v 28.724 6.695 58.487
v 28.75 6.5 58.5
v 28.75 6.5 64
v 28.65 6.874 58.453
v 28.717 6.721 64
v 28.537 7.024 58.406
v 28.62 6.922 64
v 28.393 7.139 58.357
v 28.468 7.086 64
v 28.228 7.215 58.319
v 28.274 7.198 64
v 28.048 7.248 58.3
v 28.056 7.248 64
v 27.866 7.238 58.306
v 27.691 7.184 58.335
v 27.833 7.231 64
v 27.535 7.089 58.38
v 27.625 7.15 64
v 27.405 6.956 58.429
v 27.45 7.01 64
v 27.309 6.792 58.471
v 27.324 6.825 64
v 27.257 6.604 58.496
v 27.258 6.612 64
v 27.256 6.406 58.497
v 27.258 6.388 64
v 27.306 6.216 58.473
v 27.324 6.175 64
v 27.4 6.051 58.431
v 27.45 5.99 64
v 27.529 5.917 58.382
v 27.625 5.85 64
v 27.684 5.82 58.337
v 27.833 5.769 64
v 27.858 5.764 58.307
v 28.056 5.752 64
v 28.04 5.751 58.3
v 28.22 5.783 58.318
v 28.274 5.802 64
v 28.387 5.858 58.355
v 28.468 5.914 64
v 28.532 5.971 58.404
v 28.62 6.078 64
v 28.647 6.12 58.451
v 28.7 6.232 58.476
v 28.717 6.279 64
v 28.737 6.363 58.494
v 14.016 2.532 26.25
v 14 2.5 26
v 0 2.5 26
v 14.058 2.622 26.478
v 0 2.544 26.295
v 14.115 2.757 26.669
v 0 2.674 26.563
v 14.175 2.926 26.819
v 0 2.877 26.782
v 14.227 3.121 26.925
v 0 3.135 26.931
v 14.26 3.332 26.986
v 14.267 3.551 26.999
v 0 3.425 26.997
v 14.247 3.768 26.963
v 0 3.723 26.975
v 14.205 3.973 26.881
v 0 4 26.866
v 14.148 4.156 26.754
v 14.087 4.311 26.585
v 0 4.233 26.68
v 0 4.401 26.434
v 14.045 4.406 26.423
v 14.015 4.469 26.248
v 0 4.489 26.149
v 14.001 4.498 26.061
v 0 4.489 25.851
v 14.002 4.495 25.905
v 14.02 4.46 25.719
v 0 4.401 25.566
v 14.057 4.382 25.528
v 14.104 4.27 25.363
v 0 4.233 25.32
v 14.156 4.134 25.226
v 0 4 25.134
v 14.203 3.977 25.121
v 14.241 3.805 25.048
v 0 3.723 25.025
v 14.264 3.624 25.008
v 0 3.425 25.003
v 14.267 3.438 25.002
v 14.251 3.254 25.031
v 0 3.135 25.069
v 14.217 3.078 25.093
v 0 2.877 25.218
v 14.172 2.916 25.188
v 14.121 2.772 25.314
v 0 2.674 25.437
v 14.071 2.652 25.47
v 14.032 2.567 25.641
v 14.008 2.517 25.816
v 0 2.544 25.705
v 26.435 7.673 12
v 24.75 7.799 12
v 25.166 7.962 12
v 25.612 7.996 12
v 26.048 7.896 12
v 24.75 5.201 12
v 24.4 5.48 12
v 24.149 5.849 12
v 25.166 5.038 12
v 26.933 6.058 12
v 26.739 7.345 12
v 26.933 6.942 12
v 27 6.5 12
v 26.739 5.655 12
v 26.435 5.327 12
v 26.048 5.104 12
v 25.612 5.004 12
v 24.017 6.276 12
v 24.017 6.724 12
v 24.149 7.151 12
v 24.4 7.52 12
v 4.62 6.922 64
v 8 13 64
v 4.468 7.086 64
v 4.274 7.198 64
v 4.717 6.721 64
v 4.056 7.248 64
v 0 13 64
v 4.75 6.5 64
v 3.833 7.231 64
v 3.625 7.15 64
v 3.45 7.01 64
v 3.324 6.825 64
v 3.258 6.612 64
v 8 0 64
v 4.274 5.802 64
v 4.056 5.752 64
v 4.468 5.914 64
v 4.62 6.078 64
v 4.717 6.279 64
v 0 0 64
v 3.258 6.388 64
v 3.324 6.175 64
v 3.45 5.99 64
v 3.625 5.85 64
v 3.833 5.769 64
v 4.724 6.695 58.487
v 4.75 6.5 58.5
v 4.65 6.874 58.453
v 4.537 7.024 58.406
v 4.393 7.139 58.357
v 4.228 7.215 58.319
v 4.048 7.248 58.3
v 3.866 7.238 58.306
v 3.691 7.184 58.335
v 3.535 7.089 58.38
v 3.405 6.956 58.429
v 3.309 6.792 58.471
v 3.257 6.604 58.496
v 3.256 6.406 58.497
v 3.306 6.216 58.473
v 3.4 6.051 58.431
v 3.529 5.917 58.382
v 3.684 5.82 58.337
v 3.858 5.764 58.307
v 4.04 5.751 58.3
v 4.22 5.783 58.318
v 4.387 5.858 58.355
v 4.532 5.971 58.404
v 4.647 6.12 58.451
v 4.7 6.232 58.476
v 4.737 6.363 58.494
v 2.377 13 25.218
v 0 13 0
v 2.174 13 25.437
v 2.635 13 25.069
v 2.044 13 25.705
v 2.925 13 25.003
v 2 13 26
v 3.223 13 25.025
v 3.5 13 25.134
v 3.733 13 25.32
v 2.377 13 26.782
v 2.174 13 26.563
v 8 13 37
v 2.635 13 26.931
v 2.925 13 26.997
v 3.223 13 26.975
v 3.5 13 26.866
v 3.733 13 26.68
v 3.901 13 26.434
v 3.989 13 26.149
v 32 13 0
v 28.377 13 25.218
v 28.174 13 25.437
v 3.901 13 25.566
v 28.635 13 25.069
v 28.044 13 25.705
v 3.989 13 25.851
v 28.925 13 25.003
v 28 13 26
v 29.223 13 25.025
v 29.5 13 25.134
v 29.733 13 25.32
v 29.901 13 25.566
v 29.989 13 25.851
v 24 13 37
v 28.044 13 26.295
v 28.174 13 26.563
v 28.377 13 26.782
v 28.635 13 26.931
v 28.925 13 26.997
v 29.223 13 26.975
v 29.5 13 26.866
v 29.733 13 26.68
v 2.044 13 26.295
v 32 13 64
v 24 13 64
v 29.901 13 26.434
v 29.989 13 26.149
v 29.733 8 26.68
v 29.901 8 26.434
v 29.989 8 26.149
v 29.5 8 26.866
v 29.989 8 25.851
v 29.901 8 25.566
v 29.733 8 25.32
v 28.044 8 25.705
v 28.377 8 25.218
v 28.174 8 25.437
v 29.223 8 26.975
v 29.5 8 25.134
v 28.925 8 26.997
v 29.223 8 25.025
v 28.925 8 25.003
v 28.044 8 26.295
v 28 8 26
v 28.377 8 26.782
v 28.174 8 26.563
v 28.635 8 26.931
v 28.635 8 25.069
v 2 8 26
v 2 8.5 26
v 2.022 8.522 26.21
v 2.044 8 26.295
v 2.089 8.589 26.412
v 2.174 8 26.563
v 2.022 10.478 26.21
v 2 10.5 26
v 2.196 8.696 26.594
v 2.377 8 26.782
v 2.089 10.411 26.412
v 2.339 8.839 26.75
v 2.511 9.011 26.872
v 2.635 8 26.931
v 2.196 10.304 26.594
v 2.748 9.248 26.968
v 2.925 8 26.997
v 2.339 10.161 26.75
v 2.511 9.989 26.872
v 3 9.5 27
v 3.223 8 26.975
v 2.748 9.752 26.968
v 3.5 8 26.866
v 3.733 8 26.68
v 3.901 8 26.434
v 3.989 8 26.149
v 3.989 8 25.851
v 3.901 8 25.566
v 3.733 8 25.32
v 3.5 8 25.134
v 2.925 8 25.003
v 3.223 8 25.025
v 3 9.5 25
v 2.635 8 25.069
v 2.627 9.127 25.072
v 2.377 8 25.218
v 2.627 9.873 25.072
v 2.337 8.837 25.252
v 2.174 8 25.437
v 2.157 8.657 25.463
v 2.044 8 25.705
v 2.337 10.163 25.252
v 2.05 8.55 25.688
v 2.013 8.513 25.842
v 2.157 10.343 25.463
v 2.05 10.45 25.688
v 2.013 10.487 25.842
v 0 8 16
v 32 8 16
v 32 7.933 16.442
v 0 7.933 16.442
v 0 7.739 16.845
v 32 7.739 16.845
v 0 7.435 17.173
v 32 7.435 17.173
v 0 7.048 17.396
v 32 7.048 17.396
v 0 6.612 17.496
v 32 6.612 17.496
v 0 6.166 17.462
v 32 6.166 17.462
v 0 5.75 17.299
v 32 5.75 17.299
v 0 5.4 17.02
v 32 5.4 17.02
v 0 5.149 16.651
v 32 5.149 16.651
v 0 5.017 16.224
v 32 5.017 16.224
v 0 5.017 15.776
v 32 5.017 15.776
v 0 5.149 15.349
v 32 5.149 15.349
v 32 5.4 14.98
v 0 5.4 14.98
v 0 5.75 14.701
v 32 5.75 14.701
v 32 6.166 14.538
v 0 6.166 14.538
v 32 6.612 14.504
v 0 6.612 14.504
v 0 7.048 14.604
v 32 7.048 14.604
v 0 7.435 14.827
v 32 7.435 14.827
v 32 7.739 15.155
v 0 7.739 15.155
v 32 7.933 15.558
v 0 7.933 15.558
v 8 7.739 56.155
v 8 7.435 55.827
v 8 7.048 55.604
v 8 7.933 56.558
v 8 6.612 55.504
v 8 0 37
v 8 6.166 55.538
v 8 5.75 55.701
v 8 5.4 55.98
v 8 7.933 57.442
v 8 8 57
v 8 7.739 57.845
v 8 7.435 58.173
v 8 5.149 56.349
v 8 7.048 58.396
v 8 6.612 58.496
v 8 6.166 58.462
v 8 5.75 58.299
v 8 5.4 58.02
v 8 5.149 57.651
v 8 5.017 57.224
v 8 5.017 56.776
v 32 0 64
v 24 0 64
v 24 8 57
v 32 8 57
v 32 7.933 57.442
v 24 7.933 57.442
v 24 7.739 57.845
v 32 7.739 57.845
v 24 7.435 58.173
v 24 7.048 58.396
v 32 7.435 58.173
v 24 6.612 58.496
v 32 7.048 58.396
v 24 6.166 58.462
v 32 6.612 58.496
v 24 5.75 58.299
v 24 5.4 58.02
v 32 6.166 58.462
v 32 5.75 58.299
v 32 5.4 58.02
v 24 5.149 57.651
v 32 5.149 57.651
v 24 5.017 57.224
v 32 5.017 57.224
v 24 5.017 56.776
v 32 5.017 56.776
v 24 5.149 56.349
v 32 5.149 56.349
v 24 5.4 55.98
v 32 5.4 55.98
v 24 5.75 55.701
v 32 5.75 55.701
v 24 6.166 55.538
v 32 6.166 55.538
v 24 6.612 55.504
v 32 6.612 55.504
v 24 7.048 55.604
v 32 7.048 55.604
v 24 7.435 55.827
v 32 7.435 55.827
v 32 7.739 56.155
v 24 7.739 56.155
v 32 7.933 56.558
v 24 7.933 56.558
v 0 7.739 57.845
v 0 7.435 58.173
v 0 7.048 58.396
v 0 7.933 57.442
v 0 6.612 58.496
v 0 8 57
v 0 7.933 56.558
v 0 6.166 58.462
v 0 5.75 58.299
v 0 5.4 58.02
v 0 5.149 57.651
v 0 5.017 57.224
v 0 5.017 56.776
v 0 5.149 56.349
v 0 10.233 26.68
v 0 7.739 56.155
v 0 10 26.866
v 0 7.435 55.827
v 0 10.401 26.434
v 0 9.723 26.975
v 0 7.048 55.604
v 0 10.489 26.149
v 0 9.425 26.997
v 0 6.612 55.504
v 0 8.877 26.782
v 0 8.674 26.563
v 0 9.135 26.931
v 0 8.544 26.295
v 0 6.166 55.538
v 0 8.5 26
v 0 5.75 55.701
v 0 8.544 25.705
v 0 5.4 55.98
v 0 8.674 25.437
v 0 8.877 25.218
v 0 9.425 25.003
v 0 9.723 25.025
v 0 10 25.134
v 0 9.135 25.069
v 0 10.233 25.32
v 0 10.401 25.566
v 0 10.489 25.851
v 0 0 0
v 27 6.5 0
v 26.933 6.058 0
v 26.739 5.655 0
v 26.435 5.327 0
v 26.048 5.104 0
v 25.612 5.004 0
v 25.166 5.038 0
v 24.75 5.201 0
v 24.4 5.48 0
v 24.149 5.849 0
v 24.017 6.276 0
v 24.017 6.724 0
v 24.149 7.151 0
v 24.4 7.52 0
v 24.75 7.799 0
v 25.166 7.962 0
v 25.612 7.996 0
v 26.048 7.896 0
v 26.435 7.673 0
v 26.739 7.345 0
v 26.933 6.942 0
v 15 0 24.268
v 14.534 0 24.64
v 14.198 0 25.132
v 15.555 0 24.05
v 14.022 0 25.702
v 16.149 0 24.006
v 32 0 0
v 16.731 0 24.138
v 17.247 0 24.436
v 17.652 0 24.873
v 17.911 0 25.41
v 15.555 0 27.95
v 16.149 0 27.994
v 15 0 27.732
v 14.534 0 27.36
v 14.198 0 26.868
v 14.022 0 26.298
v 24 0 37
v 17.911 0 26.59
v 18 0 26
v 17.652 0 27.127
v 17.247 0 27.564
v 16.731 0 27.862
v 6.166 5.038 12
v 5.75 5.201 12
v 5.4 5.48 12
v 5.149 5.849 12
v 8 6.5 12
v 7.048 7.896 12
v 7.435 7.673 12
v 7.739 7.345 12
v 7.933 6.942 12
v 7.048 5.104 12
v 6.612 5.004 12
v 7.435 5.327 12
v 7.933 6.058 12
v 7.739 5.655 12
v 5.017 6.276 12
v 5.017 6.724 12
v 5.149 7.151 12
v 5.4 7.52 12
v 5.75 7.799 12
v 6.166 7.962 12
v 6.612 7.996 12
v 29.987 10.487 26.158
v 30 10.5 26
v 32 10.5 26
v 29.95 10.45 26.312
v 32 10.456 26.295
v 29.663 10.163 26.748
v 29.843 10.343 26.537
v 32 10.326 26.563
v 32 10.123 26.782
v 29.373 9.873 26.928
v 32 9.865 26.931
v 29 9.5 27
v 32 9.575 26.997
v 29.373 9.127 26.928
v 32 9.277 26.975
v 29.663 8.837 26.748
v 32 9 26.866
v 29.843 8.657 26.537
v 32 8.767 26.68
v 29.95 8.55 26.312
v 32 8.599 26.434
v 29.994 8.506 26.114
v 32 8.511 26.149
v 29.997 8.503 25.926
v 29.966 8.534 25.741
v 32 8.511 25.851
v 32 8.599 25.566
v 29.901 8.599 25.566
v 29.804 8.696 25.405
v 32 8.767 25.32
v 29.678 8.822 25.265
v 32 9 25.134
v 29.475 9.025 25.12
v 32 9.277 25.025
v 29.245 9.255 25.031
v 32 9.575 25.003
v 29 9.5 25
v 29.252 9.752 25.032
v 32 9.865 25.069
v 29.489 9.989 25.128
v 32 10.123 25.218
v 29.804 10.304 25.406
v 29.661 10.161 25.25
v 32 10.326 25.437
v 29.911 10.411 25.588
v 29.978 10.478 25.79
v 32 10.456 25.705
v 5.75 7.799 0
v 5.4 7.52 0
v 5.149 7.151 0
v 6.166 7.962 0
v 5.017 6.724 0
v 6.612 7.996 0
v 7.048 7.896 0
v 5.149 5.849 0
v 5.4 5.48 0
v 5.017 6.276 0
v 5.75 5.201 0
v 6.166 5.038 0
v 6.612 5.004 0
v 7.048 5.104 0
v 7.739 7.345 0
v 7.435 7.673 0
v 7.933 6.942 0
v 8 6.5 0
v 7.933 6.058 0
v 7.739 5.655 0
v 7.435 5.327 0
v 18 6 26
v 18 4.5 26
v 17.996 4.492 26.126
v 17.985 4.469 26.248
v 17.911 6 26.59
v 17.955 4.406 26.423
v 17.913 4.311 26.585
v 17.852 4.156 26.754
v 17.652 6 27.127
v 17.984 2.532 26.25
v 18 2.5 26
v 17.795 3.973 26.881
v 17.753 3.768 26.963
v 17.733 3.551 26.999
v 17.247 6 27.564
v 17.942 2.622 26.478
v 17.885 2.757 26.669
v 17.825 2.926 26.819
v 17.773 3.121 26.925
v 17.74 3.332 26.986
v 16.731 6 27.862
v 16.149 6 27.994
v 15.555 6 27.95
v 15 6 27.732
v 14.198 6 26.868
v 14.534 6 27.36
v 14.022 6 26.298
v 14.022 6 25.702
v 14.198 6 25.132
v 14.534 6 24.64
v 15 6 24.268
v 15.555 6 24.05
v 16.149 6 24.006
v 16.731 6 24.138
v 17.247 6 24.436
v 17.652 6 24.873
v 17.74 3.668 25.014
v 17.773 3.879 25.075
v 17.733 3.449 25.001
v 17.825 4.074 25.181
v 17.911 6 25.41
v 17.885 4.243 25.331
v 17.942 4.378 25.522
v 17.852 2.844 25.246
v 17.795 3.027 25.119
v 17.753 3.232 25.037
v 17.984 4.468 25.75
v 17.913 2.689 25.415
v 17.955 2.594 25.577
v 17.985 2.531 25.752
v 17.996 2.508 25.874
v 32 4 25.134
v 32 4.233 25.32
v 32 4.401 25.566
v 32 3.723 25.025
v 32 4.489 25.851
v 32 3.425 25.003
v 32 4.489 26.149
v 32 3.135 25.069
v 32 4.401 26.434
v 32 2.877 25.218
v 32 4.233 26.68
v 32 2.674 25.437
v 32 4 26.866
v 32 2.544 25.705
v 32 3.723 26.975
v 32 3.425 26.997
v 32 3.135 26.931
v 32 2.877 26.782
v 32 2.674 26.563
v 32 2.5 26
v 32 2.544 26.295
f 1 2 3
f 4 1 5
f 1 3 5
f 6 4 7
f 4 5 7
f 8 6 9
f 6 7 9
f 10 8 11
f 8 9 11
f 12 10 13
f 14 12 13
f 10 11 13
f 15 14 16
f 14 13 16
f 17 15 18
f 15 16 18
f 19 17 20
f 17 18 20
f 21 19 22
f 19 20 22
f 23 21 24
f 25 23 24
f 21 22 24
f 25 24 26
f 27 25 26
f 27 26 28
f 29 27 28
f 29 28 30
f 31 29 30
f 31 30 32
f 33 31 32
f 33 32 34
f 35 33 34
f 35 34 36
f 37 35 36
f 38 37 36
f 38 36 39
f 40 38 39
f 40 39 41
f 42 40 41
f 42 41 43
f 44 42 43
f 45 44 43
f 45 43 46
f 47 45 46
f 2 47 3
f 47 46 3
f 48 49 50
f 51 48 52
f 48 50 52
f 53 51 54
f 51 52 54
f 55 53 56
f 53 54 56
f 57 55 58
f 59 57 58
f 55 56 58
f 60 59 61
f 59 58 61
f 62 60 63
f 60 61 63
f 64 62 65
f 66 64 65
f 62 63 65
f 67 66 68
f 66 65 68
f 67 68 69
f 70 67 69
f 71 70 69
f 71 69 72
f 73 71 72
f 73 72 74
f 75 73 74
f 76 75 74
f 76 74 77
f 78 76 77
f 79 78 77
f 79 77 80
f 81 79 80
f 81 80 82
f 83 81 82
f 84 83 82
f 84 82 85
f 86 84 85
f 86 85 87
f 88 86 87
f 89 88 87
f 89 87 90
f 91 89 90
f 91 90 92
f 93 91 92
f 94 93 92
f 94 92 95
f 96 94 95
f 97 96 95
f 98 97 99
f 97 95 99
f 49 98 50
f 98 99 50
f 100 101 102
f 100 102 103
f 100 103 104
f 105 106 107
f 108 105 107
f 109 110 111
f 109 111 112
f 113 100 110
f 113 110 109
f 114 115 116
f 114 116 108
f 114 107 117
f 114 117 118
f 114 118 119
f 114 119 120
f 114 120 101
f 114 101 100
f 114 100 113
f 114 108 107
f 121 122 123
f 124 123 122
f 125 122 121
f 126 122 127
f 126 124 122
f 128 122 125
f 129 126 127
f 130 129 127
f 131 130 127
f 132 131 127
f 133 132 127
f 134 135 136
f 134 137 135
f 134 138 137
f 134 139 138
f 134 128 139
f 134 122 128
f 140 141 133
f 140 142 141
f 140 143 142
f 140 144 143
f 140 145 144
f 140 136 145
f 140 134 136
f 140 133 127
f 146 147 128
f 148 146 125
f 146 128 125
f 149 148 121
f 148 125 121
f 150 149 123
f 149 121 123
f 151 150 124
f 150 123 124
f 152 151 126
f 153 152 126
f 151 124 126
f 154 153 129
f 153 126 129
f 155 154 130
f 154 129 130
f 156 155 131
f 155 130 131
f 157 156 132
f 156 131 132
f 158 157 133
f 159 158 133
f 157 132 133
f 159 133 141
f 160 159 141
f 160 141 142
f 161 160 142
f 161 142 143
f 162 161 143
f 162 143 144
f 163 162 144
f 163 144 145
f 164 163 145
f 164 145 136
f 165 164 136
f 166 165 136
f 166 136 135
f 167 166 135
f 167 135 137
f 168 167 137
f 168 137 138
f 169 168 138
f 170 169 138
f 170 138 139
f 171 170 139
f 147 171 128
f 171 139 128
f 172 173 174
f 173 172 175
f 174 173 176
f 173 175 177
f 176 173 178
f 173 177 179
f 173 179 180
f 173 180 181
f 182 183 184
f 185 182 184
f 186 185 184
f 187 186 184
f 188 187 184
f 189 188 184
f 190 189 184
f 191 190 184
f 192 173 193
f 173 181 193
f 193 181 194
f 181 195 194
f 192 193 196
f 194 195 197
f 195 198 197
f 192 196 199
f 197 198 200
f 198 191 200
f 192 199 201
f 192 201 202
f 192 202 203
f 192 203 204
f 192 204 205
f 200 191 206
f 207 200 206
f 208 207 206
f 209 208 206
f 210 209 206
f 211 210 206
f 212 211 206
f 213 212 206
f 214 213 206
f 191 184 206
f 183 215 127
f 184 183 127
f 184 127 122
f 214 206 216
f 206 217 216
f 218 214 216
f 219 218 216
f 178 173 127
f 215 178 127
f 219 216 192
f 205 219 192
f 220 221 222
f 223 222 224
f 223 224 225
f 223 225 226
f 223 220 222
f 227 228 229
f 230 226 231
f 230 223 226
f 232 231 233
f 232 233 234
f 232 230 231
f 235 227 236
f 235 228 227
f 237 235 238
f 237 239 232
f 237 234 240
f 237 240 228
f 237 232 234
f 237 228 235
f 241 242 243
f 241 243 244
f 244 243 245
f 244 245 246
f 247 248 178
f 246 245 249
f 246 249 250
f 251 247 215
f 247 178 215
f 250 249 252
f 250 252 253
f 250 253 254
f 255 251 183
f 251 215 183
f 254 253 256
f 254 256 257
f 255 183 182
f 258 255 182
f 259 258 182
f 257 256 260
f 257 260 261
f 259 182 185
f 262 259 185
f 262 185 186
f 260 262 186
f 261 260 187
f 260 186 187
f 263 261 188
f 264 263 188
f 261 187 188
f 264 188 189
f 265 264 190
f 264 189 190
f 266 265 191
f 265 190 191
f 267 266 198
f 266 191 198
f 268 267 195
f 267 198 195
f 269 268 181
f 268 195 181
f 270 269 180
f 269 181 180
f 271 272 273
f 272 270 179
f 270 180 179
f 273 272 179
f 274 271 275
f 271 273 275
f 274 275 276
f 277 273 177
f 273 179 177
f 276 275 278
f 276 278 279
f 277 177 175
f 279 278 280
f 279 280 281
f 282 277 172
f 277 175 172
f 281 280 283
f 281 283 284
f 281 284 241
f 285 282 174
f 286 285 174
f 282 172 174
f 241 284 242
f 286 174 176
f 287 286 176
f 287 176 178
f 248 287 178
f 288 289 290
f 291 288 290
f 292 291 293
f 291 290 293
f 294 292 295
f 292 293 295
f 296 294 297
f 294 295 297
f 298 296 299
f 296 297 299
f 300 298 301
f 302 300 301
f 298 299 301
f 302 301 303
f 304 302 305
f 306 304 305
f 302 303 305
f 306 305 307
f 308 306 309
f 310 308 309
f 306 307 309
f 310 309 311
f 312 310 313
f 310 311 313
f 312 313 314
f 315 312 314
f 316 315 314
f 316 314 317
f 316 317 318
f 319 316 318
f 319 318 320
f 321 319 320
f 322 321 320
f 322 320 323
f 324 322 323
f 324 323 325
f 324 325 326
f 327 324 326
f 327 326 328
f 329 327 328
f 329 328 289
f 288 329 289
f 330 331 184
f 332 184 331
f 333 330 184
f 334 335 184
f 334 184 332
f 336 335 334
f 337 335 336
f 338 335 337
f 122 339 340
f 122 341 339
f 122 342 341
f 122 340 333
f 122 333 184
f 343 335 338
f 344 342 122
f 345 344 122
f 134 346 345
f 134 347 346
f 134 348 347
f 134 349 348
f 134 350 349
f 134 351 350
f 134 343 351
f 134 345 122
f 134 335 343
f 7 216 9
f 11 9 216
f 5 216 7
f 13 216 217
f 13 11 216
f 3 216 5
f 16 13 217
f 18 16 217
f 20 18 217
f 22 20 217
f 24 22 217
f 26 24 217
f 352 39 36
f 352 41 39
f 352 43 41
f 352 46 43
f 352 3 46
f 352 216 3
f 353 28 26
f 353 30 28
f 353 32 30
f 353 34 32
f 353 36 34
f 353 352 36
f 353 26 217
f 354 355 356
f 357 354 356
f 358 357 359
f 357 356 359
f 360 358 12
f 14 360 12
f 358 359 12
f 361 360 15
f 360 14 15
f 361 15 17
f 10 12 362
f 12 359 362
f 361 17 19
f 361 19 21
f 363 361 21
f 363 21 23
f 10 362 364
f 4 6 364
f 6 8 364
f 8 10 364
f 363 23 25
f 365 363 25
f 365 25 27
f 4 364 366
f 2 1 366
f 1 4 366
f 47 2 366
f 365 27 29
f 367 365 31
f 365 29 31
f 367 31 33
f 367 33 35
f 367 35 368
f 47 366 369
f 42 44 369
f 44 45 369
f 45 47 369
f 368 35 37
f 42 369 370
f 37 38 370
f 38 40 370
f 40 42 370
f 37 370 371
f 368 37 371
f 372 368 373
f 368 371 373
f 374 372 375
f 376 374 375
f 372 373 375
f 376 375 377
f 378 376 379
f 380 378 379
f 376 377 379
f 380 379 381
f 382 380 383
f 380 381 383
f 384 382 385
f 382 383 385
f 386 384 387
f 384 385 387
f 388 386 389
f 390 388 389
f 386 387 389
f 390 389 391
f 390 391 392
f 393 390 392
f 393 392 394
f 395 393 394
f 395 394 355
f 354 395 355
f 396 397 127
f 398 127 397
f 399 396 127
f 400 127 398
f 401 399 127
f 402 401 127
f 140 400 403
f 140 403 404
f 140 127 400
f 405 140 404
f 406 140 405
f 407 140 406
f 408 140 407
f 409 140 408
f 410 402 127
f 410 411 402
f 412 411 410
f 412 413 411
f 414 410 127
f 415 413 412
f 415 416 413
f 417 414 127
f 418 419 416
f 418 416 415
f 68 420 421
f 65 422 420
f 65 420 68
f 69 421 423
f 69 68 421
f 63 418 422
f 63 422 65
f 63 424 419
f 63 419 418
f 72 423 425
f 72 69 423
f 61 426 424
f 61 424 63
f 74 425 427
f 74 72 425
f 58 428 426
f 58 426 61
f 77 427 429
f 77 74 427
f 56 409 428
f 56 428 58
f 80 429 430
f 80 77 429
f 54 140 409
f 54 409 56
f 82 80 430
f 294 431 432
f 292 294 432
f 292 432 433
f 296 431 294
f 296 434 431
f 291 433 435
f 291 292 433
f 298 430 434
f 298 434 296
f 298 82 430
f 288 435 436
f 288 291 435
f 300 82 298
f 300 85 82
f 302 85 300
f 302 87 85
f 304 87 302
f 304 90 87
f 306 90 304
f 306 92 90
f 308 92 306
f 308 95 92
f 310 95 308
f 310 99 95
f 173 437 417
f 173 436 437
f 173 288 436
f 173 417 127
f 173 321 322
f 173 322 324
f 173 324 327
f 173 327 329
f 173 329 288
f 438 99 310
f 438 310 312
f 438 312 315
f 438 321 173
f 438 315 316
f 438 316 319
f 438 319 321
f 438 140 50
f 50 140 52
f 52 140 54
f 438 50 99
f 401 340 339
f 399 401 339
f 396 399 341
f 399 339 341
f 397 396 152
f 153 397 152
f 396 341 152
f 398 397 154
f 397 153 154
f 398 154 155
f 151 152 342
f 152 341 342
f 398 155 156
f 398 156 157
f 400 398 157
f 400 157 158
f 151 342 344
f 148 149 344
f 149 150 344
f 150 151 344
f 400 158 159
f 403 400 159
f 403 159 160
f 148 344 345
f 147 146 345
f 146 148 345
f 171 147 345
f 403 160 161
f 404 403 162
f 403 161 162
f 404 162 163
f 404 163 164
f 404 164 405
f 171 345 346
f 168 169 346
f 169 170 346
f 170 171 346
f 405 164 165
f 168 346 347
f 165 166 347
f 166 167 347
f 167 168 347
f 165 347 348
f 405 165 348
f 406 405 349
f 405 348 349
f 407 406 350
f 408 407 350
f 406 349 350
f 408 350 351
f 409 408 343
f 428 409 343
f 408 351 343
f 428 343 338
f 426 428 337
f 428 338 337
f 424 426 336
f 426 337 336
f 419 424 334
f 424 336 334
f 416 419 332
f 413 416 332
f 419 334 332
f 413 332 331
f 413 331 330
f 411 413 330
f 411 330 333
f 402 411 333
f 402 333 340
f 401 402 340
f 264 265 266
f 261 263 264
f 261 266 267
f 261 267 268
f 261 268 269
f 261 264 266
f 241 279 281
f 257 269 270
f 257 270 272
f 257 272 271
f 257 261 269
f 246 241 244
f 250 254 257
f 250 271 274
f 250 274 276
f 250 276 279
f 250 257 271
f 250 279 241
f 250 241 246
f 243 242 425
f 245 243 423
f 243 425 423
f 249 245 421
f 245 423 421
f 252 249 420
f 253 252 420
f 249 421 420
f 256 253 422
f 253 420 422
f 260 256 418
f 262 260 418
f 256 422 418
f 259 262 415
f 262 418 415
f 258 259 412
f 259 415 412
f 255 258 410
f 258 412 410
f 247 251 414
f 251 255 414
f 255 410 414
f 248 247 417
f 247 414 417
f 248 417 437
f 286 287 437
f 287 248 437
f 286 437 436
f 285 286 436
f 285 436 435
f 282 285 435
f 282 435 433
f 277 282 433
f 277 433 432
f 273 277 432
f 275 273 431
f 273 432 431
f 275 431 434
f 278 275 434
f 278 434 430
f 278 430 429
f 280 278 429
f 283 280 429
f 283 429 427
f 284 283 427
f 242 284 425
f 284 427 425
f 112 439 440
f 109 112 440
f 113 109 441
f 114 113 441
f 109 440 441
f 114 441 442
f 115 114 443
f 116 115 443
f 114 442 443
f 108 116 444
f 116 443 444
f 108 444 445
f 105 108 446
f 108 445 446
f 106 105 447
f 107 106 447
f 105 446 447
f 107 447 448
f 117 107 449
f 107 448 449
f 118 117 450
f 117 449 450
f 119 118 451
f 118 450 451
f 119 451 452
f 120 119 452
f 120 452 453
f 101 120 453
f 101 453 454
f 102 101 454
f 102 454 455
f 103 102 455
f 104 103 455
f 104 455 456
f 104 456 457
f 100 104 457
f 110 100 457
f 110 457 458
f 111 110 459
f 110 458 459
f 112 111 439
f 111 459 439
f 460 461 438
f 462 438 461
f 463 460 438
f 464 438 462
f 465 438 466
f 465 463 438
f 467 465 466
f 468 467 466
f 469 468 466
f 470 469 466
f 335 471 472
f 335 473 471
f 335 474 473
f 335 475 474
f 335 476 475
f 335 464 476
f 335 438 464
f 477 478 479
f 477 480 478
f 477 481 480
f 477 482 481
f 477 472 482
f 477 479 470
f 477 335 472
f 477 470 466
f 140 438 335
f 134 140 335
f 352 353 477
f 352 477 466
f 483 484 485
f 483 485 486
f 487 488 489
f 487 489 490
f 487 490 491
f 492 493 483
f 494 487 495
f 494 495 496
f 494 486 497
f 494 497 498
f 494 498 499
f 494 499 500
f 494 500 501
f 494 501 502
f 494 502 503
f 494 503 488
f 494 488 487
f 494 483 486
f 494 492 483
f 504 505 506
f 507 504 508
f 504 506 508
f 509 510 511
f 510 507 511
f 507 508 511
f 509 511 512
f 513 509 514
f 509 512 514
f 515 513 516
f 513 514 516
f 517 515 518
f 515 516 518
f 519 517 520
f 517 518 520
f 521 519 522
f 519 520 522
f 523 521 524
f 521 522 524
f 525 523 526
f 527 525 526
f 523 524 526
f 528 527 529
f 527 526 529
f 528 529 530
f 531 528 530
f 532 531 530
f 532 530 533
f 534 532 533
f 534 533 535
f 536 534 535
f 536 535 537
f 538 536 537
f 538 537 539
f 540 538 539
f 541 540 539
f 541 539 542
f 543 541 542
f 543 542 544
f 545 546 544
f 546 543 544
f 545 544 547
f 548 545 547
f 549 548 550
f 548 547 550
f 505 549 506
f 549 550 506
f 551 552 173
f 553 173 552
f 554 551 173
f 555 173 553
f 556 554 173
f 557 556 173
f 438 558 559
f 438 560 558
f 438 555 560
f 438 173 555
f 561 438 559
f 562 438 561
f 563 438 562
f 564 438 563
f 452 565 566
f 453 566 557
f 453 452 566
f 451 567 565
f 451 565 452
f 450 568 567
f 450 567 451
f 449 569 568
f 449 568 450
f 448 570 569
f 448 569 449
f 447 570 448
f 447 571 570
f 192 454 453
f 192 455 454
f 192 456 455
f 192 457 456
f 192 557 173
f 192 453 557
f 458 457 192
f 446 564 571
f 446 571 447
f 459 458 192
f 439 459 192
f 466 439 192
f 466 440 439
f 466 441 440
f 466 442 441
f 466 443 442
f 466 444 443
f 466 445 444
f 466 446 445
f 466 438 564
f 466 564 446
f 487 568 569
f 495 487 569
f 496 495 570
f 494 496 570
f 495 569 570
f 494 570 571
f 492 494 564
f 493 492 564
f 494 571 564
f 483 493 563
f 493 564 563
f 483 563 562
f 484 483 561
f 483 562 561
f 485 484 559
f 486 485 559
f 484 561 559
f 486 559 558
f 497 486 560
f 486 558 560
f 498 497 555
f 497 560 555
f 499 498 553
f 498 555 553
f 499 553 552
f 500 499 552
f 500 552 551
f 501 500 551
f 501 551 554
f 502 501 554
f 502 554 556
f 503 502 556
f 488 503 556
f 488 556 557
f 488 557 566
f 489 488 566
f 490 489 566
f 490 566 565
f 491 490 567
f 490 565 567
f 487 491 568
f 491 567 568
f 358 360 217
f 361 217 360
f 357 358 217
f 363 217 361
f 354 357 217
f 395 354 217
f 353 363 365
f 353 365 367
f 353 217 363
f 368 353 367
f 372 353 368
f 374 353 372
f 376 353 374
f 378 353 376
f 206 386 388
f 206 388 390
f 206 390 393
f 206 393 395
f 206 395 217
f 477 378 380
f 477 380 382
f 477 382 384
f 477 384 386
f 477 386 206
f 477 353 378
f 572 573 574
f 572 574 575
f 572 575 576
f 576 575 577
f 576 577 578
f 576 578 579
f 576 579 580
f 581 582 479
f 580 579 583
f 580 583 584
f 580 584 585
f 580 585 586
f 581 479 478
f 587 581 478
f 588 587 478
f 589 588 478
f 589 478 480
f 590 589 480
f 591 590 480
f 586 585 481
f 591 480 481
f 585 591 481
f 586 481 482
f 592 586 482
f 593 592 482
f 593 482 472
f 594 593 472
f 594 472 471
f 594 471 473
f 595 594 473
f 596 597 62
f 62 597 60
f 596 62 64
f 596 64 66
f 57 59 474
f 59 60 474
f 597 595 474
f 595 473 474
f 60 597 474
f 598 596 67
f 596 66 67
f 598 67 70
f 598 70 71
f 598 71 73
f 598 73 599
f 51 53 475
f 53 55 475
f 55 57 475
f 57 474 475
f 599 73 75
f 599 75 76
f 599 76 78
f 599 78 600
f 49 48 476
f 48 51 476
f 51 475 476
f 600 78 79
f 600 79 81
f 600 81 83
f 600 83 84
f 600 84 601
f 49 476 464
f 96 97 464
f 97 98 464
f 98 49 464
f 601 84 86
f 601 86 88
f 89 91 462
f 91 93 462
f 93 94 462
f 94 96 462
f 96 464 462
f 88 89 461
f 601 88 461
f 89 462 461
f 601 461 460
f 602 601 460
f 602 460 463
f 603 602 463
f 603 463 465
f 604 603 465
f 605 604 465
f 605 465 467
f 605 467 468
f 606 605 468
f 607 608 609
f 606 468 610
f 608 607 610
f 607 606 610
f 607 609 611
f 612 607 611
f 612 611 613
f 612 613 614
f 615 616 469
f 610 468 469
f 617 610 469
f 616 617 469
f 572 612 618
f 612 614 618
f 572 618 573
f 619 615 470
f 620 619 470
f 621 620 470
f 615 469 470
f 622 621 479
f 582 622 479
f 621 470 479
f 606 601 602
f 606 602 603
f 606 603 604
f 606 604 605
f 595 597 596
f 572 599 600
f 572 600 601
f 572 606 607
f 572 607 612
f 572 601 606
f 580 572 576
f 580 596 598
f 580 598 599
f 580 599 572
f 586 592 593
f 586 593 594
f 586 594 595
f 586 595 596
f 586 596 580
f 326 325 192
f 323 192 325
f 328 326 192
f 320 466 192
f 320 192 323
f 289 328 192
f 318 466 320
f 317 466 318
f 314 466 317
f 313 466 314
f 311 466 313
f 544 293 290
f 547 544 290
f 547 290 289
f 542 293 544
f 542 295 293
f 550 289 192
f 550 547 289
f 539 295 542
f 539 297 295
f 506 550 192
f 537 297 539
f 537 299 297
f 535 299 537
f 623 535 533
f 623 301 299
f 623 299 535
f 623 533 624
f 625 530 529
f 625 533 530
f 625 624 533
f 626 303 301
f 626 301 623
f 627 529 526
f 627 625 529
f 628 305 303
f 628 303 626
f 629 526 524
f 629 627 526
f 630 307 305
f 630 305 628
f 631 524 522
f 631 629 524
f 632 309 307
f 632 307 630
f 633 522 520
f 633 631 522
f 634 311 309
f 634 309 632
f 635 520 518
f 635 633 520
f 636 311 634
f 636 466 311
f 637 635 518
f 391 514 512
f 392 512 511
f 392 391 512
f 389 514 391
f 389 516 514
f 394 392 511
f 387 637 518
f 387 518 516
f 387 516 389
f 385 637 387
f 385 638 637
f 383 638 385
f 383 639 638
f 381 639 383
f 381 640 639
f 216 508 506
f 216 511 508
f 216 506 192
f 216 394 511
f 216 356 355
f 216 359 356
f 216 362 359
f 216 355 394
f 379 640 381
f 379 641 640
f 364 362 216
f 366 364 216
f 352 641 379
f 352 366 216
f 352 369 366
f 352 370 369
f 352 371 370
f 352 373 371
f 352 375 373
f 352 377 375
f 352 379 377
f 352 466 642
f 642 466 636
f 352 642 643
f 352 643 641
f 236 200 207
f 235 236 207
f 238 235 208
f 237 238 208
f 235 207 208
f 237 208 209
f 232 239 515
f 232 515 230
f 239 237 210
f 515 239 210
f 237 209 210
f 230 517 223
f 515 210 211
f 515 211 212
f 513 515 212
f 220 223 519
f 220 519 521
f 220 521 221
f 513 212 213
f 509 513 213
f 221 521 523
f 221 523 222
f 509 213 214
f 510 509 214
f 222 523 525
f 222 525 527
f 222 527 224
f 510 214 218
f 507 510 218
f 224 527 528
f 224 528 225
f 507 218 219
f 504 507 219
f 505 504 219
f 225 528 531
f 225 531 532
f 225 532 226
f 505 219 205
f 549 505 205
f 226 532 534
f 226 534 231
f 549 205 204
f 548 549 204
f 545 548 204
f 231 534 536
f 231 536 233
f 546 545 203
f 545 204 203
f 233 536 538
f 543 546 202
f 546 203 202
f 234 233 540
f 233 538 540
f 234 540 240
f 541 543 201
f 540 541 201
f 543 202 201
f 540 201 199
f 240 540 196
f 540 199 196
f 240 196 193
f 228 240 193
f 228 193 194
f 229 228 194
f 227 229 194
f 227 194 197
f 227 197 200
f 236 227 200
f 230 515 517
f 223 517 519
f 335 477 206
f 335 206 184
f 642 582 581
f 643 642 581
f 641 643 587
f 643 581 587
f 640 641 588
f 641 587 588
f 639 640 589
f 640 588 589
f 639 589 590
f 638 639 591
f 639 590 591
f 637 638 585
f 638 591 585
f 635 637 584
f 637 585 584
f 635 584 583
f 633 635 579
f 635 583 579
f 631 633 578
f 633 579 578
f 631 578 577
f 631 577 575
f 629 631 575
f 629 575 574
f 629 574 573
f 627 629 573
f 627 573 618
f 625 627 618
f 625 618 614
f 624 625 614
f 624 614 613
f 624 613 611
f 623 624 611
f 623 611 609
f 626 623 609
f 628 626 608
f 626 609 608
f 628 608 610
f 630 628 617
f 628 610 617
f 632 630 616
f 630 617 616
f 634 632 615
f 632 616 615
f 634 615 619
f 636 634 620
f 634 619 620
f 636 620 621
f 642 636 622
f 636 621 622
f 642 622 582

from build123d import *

# Parameters (mm, degrees)
F1_DEPTH  = 13
F2_R      = 1.5
F3_DEPTH  = 12
F4_R      = 1.5
F5_DEPTH  = 32.001
F6_DEPTH  = 32.001
F7_R      = 2
F8_DEPTH  = 6
F9_R      = 1
F10_DEPTH = 32.001
F11_R     = 1
F12_DEPTH = 5
F13_R     = 1
F14_DEPTH = 3.001
F15_R     = 1
F16_DEPTH = 3.001
F17_R     = 0.75
F18_DEPTH = 5.7019619943


with BuildPart() as f1:
    # F0 (on Front) → F1 (new body)
    with BuildSketch(Plane.XZ):
        Polygon((0, 64), (0, 0), (32, 0), (32, 64), (24, 64), (24, 37), (8, 37), (8, 64), align=None)
    extrude(amount=-F1_DEPTH)

    # F2 (on face) → F3 (cut)
    with BuildSketch(Plane(origin=(0, 0, 0), x_dir=(1, 0, 0), z_dir=(0, 0, -1))):
        with Locations((6.5, -6.5)):
            Circle(F2_R)
        with Locations((25.5, -6.5)):
            Circle(F2_R)
    extrude(amount=-F3_DEPTH, mode=Mode.SUBTRACT)

    # F4 (on face) → F5 (cut, through all)
    with BuildSketch(Plane.YZ.offset(32)):
        with Locations((6.5, 57)):
            Circle(F4_R)
    extrude(amount=-F5_DEPTH, mode=Mode.SUBTRACT)

    # F4 (on face) → F6 (cut, through all)
    with BuildSketch(Plane.YZ.offset(32)):
        with Locations((6.5, 16)):
            Circle(F4_R)
    extrude(amount=-F6_DEPTH, mode=Mode.SUBTRACT)

    # F7 (on face) → F8 (cut)
    with BuildSketch(Plane.XZ):
        with Locations((16, 26)):
            Circle(F7_R)
    extrude(amount=-F8_DEPTH, mode=Mode.SUBTRACT)

    # F9 (on face) → F10 (cut, through all)
    with BuildSketch(Plane(origin=(0, 0, 0), x_dir=(0, -1, 0), z_dir=(-1, 0, 0))):
        with Locations((-3.5, 26)):
            Circle(F9_R)
    extrude(amount=-F10_DEPTH, mode=Mode.SUBTRACT)

    # F11 (on face) → F12 (cut)
    with BuildSketch(Plane(origin=(0, 13, 0), x_dir=(-1, 0, 0), z_dir=(0, 1, 0))):
        with Locations((-29, 26)):
            Circle(F11_R)
        with Locations((-3, 26)):
            Circle(F11_R)
    extrude(amount=-F12_DEPTH, mode=Mode.SUBTRACT)

    # F13 (on face) → F14 (cut, through all)
    with BuildSketch(Plane(origin=(0, 0, 0), x_dir=(0, -1, 0), z_dir=(-1, 0, 0))):
        with Locations((-9.5, 26)):
            Circle(F13_R)
    extrude(amount=-F14_DEPTH, mode=Mode.SUBTRACT)

    # F15 (on face) → F16 (cut, through all)
    with BuildSketch(Plane.YZ.offset(32)):
        with Locations((9.5, 26)):
            Circle(F15_R)
    extrude(amount=-F16_DEPTH, mode=Mode.SUBTRACT)

    # F17 (on face) → F18 (cut, through all)
    with BuildSketch(Plane.XY.offset(64)):
        with Locations((4, 6.5)):
            Circle(F17_R)
        with Locations((28, 6.5)):
            Circle(F17_R)
    extrude(amount=-F18_DEPTH, mode=Mode.SUBTRACT)


solid = f1.part
